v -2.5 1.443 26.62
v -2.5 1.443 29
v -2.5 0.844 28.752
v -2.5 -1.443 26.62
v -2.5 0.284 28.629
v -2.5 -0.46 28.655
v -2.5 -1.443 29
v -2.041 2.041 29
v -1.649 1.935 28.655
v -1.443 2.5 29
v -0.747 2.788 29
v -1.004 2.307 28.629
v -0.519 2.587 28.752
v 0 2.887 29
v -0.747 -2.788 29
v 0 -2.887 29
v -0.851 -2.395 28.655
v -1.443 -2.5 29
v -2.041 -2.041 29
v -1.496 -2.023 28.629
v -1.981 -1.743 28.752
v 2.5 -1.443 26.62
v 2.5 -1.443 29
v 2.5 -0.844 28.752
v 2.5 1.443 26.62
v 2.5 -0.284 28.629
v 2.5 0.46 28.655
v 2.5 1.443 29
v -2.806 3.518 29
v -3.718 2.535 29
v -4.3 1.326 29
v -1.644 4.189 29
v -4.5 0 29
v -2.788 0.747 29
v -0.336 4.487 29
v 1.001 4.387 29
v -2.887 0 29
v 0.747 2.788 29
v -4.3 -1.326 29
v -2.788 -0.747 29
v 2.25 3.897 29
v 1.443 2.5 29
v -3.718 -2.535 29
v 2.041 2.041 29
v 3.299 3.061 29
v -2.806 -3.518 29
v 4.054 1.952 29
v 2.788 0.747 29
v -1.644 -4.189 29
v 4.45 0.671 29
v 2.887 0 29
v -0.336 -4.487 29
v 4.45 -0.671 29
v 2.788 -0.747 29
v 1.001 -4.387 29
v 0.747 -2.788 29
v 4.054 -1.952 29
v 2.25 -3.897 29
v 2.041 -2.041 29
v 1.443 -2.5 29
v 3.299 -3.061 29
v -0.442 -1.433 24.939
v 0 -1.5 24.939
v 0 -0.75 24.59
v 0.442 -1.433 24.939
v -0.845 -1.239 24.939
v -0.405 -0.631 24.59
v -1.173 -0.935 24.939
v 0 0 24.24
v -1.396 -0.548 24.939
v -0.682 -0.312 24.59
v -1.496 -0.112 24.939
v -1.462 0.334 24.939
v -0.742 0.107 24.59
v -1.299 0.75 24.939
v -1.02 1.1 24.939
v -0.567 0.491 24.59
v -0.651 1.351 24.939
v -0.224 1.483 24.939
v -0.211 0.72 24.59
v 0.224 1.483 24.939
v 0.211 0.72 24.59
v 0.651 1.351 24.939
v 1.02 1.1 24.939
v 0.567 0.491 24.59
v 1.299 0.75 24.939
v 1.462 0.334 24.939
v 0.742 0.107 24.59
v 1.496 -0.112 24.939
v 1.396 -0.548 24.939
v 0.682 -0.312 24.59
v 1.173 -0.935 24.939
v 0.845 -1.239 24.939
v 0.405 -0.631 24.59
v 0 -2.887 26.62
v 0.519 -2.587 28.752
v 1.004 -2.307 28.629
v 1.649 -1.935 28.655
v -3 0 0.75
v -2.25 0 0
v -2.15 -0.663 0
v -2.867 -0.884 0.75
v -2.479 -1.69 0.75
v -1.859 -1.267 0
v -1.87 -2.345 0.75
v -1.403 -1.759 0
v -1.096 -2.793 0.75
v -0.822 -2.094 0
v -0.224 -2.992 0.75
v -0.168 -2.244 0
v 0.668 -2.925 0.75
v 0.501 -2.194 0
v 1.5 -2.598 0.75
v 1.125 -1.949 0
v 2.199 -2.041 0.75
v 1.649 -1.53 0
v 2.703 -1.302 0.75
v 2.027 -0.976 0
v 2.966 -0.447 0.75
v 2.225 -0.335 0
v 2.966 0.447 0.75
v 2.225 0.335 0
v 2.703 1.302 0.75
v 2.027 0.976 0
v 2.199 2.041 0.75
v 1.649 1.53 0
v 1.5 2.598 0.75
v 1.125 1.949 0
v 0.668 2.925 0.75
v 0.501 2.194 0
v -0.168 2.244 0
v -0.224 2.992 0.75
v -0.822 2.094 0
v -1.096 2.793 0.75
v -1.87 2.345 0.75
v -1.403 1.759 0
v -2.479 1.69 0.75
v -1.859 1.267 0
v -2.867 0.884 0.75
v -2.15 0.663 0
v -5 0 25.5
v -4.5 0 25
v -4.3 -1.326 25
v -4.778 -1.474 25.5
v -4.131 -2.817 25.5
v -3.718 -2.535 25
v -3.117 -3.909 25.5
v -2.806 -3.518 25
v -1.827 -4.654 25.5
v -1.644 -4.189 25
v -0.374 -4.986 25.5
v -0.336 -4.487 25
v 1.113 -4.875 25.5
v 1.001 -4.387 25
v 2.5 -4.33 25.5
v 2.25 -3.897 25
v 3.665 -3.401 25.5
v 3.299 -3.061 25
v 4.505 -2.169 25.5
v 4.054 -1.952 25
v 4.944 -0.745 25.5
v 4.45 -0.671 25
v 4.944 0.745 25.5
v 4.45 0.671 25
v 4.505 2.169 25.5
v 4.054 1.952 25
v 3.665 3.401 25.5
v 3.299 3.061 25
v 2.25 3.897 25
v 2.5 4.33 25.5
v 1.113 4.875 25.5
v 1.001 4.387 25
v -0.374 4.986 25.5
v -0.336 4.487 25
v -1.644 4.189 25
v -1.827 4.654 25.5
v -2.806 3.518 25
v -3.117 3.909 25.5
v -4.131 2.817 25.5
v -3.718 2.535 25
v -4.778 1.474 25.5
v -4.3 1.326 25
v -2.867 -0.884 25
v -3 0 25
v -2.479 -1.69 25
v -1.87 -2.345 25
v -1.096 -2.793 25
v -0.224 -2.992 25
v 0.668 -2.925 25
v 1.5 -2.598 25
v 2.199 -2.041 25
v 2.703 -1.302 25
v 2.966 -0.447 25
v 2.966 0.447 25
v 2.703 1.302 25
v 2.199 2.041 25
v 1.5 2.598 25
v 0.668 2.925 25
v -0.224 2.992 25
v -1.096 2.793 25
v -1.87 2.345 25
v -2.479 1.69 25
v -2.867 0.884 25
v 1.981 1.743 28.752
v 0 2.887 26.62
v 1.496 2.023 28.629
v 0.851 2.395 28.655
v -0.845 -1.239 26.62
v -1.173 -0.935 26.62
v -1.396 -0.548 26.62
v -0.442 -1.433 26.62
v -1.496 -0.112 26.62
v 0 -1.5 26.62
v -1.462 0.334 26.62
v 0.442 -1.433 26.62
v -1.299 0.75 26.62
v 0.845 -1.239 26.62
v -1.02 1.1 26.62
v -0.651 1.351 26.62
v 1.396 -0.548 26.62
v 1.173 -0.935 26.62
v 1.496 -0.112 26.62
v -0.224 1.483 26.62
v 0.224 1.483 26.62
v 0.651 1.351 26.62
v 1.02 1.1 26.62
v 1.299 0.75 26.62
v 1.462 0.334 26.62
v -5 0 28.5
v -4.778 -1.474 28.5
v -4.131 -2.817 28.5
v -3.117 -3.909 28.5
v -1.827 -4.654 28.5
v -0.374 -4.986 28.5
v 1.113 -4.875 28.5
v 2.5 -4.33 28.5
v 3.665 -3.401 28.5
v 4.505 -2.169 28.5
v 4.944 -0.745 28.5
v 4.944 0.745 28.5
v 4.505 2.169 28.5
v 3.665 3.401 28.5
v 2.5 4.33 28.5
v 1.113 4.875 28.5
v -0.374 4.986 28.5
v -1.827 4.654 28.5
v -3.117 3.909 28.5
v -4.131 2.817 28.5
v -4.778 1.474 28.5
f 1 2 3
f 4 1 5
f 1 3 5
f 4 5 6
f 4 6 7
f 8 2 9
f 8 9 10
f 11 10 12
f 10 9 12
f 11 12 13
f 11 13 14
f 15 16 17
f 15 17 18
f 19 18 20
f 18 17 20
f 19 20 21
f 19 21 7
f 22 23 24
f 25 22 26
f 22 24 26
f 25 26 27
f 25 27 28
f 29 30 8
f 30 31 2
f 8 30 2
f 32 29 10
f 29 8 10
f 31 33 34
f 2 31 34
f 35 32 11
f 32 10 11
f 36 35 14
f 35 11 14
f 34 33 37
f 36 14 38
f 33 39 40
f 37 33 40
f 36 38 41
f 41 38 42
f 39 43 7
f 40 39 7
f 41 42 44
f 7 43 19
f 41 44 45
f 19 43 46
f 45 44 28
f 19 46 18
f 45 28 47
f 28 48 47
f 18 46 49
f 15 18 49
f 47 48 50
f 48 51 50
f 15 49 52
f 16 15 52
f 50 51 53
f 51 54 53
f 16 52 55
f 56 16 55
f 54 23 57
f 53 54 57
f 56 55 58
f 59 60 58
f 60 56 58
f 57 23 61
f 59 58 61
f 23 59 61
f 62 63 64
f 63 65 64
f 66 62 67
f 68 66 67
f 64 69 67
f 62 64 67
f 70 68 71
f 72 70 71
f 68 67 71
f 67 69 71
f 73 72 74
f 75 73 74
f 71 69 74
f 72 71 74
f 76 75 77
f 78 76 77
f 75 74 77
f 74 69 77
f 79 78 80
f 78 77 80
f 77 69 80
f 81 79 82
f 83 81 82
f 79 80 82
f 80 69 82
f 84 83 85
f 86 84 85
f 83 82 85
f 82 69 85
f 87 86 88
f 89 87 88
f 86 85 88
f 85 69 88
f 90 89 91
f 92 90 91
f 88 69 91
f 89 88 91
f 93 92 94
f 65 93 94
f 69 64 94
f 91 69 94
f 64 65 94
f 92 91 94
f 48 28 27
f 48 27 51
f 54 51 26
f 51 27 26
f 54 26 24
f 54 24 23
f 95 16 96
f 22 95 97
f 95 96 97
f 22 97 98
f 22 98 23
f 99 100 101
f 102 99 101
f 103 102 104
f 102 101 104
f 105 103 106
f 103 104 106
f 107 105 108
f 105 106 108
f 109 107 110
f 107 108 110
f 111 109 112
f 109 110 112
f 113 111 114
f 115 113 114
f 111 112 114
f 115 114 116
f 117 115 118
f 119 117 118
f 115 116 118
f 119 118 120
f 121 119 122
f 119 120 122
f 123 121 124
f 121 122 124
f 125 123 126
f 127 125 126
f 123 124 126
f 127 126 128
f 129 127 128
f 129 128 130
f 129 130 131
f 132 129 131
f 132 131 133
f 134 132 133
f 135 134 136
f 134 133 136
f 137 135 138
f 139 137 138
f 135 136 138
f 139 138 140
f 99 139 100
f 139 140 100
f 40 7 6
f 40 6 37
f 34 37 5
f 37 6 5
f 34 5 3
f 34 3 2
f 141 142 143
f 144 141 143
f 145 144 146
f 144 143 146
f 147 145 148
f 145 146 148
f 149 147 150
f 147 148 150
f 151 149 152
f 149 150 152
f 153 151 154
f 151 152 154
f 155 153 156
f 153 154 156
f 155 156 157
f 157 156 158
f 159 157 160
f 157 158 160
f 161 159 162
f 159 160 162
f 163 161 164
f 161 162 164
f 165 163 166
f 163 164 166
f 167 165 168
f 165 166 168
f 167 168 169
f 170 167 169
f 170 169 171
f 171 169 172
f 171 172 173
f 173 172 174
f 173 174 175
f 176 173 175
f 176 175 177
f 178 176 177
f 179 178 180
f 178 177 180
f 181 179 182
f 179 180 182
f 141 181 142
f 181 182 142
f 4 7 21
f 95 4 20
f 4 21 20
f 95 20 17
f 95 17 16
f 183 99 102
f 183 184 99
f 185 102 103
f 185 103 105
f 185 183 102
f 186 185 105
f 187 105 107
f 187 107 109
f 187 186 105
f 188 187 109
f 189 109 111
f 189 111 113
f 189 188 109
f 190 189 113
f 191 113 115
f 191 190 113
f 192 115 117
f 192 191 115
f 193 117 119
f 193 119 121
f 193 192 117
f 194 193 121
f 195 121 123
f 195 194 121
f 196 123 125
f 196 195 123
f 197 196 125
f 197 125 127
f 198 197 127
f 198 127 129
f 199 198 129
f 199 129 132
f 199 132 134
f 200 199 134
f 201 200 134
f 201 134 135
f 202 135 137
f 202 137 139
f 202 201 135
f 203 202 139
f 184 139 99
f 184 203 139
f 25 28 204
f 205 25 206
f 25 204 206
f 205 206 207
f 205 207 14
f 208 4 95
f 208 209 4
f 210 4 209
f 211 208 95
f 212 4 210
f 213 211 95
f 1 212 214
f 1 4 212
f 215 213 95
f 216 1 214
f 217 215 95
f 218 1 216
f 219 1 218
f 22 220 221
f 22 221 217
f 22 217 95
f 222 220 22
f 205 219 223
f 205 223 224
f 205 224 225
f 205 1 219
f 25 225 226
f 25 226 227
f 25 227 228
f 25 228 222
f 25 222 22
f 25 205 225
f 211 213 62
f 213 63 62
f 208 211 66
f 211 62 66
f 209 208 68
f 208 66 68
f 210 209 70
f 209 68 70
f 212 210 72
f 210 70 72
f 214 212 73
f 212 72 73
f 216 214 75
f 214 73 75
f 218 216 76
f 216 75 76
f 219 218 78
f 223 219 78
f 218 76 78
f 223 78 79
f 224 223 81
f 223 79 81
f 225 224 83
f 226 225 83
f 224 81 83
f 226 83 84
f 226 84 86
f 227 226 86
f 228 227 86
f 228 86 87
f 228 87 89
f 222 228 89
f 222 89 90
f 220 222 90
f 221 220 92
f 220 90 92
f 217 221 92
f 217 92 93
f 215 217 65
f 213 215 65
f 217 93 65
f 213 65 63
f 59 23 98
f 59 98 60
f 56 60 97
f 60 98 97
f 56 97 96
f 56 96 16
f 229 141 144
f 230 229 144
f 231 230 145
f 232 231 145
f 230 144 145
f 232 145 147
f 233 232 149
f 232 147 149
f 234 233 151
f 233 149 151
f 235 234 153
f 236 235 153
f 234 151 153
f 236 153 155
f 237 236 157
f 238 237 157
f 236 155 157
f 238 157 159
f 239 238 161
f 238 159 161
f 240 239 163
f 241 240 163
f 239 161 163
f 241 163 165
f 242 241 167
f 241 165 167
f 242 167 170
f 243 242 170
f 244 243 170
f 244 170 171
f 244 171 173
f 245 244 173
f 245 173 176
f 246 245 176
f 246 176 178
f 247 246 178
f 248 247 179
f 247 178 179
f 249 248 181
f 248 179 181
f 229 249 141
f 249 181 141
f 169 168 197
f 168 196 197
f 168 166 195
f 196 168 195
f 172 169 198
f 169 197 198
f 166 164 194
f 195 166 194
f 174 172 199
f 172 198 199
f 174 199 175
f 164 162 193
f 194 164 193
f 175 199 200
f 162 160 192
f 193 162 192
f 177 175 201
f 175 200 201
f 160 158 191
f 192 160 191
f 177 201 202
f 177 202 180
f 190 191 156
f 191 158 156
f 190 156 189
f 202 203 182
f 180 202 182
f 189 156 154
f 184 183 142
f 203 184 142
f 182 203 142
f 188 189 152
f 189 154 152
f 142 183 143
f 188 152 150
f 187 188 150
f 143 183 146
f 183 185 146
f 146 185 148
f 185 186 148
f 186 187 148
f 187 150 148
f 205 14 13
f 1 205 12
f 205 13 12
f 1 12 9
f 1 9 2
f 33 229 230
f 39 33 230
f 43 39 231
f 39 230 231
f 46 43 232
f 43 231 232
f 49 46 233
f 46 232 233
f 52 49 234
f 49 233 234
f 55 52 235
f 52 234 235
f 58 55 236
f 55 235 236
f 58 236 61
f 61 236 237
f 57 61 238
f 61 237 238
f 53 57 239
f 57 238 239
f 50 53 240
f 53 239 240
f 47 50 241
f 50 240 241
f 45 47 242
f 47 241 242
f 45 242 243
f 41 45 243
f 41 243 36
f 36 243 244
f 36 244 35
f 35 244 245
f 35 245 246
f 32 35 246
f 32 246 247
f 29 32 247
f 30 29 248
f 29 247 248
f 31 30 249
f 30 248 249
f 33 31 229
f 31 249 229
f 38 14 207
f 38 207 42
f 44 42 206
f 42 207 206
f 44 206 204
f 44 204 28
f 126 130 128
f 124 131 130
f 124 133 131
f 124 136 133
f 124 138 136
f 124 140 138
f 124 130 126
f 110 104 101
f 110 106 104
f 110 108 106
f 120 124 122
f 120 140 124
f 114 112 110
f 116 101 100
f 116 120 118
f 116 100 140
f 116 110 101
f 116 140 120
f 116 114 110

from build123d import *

# Parameters (mm, degrees)
CHAMFER1_SIZE          = 0.5
CUT_EXTRUDE1_DEPTH     = 2.38
SPLIT1_SURFACE_1_BACK  = 33.265
SPLIT1_SURFACE_1_DEPTH = 66.53
SPLIT1_SURFACE_2_BACK  = 33.265
SPLIT1_SURFACE_2_DEPTH = 66.53
CHAMFER2_SIZE          = 0.75


with BuildPart() as part:
    # Sketch1 → Revolve1 (revolve)
    with BuildSketch(Plane.ZY):
        Polygon((0, 3), (0, 0), (29, 0), (29, 5), (25, 5), (25, 3), align=None)
    revolve(axis=Axis((0, 0, 25), (0, 0, 1)))

    # Chamfer1
    chamfer1_edges = [part.edges().sort_by_distance(p)[0] for p in [
        (0, -5, 25),
        (0, -5, 29),
    ]]
    chamfer(chamfer1_edges, length=CHAMFER1_SIZE)

    # Sketch2 → Cut-Extrude1 (cut)
    with BuildSketch(Plane.XY.offset(29)):
        Polygon((0, 2.886751346), (-2.5, 1.443375673), (-2.5, -1.443375673), (0, -2.886751346), (2.5, -1.443375673), (2.5, 1.443375673), align=None)
    extrude(amount=-CUT_EXTRUDE1_DEPTH, mode=Mode.SUBTRACT)

    # Sketch3 → Cut-Revolve1 (revolve, cut)
    with BuildSketch(Plane(origin=(0, 0, 11.32), x_dir=(0, 0, 1), z_dir=(-1, 0, 0))):
        Polygon((13.619461487, 1.5), (12.92, 0), (15.3, 0), (15.3, 1.5), align=None)
    revolve(axis=Axis((0, 0, 26.62), (0, 0, -1)), mode=Mode.SUBTRACT)

    # Cut-Extrude2 cone 1 section (through the dimple's axis) → Cut-Extrude2 (revolve, cut)
    with BuildSketch(Plane(origin=(0, 0, 29), x_dir=(0, -1, 0), z_dir=(1, 0, 0))):
        Polygon((0, 0), (2.886751346, 0), (0, 2.886751346), align=None)
    revolve(axis=Axis((0, 0, 29), (0, 0, -1)), mode=Mode.SUBTRACT)


with BuildPart() as body_2:
    # Split1: the piece behind the surface
    add(part.part)
    # Split1 surface: a surface, the sketch's curves swept straight by 66.53 mm
    with BuildLine(Plane(origin=(0, 0, 0), x_dir=(0, 0, -1), z_dir=(1, 0, 0)).offset(-SPLIT1_SURFACE_1_BACK), mode=Mode.PRIVATE) as split1_surface_1_path:
        Line((-19.5, 3), (-19.5, -3))
    split1_surface_1 = Shell.extrude(split1_surface_1_path.wire(), (1 * SPLIT1_SURFACE_1_DEPTH, 0 * SPLIT1_SURFACE_1_DEPTH, 0 * SPLIT1_SURFACE_1_DEPTH))
    split(bisect_by=split1_surface_1, keep=Keep.BOTTOM)


with BuildPart() as part_1:
    add(part.part)

    # Split1: split by a surface, the side it looks to stays
    # Split1 surface: a surface, the sketch's curves swept straight by 66.53 mm
    with BuildLine(Plane(origin=(0, 0, 0), x_dir=(0, 0, -1), z_dir=(1, 0, 0)).offset(-SPLIT1_SURFACE_2_BACK), mode=Mode.PRIVATE) as split1_surface_2_path:
        Line((-19.5, 3), (-19.5, -3))
    split1_surface_2 = Shell.extrude(split1_surface_2_path.wire(), (1 * SPLIT1_SURFACE_2_DEPTH, 0 * SPLIT1_SURFACE_2_DEPTH, 0 * SPLIT1_SURFACE_2_DEPTH))
    split(bisect_by=split1_surface_2, keep=Keep.TOP)

    # Chamfer2
    chamfer2_edges = [part_1.edges().sort_by_distance(p)[0] for p in [
        (0, -3, 0),
    ]]
    chamfer(chamfer2_edges, length=CHAMFER2_SIZE)


with BuildPart() as body_2_1:
    add(body_2.part)

    # Combine1: union part
    add(part_1.part)


solid = body_2_1.part
